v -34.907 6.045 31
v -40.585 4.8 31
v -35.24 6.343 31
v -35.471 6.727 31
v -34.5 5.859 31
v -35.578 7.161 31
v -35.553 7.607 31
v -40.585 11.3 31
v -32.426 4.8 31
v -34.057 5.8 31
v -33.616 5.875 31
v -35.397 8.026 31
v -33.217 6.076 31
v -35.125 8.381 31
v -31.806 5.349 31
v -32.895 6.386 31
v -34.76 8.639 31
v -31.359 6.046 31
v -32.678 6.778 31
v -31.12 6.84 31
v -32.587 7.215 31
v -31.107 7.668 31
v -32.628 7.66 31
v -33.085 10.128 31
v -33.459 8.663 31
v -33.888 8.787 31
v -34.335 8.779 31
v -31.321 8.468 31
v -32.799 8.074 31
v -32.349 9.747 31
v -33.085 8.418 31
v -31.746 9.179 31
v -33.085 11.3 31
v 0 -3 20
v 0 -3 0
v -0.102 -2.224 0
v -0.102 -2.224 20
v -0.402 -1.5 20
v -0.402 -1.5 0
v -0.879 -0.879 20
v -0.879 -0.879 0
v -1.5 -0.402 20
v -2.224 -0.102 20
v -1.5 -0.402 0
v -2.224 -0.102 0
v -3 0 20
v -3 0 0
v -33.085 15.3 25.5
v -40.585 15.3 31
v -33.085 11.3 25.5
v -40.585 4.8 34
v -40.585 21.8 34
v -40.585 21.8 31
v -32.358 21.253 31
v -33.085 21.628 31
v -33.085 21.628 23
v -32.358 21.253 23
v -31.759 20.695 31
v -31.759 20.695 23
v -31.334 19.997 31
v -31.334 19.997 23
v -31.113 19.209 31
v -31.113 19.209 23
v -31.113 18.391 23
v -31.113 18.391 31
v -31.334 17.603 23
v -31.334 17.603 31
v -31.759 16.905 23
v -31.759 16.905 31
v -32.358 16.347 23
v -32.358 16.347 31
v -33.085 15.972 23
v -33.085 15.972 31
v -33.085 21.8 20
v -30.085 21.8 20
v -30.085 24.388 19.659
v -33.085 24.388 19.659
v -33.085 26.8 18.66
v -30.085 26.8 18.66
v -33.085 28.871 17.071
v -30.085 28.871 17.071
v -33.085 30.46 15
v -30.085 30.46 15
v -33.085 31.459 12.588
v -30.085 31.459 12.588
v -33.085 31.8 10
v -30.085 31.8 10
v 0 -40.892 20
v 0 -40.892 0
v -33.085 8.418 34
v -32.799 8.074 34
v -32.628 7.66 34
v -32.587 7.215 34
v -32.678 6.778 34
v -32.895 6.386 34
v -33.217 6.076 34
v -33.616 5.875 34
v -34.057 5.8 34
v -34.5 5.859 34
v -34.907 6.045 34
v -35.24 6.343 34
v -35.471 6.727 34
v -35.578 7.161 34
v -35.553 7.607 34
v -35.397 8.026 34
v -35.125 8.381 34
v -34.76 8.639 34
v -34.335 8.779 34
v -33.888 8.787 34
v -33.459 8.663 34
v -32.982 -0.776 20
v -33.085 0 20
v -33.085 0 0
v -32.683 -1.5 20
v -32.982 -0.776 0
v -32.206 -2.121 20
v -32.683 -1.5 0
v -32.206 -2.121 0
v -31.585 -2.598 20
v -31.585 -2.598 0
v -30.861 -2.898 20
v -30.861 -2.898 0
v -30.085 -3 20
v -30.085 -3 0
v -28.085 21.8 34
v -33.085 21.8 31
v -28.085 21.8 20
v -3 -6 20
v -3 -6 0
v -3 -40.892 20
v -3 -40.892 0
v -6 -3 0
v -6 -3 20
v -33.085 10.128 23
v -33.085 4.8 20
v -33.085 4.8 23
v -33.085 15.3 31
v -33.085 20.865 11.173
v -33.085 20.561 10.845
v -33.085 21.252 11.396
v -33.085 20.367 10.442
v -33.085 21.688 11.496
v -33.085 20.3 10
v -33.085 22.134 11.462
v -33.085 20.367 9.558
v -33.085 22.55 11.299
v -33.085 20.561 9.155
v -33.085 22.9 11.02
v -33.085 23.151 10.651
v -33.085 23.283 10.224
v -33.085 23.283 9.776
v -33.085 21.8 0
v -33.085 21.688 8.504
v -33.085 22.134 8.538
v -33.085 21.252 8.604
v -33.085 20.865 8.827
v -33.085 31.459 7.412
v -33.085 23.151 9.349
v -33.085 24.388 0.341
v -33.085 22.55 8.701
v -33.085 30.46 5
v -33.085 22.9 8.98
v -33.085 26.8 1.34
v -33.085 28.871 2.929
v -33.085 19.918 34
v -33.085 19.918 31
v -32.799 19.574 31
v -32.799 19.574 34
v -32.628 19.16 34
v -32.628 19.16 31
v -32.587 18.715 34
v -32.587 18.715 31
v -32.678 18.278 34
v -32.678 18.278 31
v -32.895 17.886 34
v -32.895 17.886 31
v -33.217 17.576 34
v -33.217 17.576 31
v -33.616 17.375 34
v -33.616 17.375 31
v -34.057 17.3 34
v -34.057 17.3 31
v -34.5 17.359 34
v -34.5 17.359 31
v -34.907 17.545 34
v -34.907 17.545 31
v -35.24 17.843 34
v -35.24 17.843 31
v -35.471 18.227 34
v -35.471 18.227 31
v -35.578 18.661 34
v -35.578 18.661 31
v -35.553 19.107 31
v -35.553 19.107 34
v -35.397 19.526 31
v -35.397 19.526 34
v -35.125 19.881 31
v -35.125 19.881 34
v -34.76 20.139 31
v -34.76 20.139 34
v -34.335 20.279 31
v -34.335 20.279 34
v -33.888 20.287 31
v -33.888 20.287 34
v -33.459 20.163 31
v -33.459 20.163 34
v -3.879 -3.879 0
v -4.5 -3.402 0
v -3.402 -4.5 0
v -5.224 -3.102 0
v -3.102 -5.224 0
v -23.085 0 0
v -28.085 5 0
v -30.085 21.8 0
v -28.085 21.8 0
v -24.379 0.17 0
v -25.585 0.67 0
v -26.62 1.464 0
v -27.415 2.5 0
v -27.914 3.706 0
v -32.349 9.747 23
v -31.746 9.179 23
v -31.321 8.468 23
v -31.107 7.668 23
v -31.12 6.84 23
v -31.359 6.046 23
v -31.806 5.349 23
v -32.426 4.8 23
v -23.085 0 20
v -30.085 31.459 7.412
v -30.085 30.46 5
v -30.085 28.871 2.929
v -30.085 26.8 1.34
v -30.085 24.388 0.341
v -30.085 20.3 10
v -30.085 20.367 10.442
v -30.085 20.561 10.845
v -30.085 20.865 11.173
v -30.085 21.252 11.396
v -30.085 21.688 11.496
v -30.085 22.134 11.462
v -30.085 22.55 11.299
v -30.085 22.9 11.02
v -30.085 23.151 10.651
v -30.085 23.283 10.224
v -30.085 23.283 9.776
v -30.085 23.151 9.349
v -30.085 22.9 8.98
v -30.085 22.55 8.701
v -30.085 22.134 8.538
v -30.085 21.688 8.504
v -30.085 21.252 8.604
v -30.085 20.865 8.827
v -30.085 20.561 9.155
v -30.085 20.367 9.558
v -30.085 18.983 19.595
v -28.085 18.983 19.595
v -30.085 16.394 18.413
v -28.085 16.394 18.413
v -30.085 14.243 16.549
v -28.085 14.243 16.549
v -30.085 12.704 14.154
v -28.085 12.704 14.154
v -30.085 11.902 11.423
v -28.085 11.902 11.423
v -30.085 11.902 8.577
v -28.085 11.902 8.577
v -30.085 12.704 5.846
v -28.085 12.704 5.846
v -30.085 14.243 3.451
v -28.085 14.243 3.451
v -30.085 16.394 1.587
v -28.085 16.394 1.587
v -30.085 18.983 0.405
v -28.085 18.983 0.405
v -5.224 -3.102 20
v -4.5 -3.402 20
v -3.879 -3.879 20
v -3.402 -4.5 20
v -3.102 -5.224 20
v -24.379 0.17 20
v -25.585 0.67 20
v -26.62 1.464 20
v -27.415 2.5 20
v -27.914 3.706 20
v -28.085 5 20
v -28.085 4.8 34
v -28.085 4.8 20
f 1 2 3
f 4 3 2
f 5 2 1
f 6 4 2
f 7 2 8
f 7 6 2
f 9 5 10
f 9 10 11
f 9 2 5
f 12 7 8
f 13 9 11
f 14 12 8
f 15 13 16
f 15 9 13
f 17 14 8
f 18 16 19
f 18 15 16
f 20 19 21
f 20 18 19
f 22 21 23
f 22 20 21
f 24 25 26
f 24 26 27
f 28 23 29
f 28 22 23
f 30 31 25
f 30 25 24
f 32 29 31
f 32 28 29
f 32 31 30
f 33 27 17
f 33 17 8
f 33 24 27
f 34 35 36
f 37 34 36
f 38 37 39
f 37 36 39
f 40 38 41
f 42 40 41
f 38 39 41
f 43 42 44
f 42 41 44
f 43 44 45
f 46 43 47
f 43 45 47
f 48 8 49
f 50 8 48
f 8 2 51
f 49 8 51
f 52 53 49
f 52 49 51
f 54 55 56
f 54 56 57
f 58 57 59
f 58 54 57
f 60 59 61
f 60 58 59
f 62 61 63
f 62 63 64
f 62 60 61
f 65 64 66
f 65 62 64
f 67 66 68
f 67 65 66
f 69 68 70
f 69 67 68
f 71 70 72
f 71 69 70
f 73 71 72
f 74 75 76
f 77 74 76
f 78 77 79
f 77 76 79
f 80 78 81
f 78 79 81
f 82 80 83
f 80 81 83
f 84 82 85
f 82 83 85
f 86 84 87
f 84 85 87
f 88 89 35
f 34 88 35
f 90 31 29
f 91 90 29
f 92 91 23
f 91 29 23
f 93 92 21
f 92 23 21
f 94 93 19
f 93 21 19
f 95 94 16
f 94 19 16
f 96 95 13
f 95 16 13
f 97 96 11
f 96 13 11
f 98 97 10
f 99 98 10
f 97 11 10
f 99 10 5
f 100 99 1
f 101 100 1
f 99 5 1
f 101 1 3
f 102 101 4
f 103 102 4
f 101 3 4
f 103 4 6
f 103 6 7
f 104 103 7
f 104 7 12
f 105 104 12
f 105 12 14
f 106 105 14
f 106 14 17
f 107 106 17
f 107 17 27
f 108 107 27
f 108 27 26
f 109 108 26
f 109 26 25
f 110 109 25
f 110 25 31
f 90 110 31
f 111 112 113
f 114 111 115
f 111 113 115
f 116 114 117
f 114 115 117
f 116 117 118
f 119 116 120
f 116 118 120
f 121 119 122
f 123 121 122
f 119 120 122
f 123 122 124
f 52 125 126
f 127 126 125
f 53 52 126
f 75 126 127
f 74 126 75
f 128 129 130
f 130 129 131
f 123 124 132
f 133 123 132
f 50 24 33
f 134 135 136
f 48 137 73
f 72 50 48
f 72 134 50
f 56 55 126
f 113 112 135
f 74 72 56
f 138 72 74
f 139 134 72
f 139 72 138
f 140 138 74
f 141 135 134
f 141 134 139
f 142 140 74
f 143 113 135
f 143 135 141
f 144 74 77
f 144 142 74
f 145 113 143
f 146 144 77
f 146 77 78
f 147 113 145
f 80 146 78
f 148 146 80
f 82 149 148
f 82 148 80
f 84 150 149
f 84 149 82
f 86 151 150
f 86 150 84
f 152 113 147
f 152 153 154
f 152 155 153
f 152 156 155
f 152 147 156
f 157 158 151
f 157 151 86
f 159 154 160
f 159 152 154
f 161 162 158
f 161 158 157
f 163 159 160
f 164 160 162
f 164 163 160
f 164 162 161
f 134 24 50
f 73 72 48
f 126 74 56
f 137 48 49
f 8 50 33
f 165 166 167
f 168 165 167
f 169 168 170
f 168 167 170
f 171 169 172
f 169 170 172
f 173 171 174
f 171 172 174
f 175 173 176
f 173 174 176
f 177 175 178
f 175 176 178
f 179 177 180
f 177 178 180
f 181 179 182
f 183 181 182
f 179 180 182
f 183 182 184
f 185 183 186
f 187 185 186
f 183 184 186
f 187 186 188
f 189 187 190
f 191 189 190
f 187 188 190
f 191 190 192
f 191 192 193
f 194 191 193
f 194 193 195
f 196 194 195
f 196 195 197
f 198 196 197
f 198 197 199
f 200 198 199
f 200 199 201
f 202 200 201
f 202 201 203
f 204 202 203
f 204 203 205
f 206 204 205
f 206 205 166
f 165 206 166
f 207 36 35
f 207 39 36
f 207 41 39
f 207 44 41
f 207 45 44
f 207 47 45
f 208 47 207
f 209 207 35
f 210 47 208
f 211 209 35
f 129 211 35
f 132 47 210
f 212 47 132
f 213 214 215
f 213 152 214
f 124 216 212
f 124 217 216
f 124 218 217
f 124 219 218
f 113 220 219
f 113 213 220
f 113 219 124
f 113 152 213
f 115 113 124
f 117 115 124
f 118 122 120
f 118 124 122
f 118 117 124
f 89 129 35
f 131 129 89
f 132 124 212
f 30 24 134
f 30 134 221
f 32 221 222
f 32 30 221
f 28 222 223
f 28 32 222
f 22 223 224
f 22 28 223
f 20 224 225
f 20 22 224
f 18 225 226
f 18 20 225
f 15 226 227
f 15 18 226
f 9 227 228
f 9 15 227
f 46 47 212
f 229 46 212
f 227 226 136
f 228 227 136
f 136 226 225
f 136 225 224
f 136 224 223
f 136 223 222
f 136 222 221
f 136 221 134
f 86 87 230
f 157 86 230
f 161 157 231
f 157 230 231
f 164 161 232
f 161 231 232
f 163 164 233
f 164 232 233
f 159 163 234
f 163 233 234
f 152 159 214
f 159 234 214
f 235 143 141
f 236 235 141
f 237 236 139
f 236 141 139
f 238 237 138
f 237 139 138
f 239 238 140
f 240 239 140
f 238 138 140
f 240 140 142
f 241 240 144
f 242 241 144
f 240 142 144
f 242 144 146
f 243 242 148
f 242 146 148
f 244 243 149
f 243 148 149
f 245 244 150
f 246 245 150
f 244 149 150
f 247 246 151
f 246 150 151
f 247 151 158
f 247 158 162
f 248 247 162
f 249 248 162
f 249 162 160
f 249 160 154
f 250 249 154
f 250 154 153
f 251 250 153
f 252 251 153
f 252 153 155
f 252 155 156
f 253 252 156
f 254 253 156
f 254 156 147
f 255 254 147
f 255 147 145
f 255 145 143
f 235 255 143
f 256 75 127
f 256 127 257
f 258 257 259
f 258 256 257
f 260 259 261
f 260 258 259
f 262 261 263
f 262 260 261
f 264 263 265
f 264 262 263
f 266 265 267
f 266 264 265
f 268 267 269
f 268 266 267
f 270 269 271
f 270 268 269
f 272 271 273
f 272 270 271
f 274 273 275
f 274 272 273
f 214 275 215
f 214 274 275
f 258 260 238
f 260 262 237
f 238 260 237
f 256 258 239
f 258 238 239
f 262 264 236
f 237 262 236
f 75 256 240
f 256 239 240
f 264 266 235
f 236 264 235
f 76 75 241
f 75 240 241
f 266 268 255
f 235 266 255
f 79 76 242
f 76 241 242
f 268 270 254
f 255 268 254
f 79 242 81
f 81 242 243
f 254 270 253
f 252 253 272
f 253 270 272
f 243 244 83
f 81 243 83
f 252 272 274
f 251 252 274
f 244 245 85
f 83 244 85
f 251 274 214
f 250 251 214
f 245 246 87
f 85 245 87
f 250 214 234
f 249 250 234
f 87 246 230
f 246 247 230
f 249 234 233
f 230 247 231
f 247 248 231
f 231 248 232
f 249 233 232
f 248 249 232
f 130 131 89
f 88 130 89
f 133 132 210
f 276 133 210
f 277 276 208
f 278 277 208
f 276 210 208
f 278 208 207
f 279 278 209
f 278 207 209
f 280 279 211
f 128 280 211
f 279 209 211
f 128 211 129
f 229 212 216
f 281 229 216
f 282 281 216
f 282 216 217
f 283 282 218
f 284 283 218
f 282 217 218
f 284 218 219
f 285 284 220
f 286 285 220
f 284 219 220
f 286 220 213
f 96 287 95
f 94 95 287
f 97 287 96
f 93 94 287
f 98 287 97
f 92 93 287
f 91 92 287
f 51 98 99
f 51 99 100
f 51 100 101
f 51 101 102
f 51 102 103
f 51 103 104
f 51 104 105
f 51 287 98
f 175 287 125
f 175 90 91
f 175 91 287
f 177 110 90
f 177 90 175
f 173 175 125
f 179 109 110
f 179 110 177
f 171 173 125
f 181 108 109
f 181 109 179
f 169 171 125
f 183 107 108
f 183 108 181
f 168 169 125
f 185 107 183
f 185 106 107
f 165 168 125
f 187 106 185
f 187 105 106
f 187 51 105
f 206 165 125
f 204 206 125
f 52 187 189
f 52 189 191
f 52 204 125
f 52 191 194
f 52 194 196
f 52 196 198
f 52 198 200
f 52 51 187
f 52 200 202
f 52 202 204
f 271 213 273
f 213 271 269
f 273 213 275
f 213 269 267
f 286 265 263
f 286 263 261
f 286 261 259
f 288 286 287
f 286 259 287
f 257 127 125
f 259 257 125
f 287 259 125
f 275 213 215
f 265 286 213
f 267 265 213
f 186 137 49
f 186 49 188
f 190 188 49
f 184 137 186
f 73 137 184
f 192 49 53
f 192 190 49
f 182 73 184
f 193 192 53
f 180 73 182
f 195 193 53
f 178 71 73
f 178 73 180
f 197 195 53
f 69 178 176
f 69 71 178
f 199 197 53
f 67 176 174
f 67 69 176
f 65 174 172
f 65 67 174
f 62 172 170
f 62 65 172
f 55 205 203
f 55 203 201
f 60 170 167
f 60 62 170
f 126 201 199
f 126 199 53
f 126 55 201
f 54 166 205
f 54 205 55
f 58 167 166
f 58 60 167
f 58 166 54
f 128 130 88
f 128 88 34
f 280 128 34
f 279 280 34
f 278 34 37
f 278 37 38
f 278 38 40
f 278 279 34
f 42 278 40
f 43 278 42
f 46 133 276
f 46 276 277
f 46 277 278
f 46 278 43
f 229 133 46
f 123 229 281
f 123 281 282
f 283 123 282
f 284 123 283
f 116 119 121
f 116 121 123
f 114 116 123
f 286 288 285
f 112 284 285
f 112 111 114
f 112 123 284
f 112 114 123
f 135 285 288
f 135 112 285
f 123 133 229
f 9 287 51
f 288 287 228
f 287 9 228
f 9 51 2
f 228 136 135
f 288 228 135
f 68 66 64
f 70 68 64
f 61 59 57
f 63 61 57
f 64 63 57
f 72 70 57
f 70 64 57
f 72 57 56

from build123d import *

# Parameters (mm, degrees)
BOSS_EXTRUDE1_DEPTH      = 20
CUT_EXTRUDE1_DEPTH       = 3
SKETCH4_W                = 3
SKETCH4_H                = 17
BOSS_EXTRUDE2_DEPTH      = 14
SKETCH6_W                = 3
SKETCH6_H                = 17
BOSS_EXTRUDE3_DEPTH      = 7.5
SKETCH7_R                = 1.5
CUT_EXTRUDE3_DEPTH       = 7.5
SKETCH8_R                = 1.5
CUT_EXTRUDE4_DEPTH       = 10
SKETCH10_R               = 3
CUT_EXTRUDE6_DEPTH       = 8
BOSS_EXTRUDE4_DEPTH      = 2
BOSS_EXTRUDE4_DEPTH_BACK = 2
SKETCH12_W               = 14
SKETCH12_H               = 17
BOSS_EXTRUDE5_DEPTH      = 2
BOSS_EXTRUDE6_DEPTH      = 2
BOSS_EXTRUDE7_DEPTH      = 20


with BuildPart() as part:
    # Sketch1 → Boss-Extrude1 (new body)
    with BuildSketch(Plane.XY):
        with BuildLine():
            Line((-3, -6), (-3, -40.891511))
            Line((-3, -40.891511), (0, -40.891511))
            Line((0, -40.891511), (0, -3))
            ThreePointArc((0, -3), (-0.878679656, -0.878679656), (-3, 0))
            Line((-3, 0), (-27.084538342, 0))
            ThreePointArc((-27.084538342, 0), (-29.205858686, 0.878679656), (-30.084538342, 3))
            Line((-30.084538342, 3), (-30.084538342, 31.8))
            Line((-30.084538342, 31.8), (-33.084538342, 31.8))
            Line((-33.084538342, 31.8), (-33.084538342, 0))
            ThreePointArc((-33.084538342, 0), (-32.205858686, -2.121320344), (-30.084538342, -3))
            Line((-30.084538342, -3), (-6, -3))
            ThreePointArc((-6, -3), (-3.878679656, -3.878679656), (-3, -6))
        make_face()
    extrude(amount=BOSS_EXTRUDE1_DEPTH)

    # Sketch2 → Cut-Extrude1 (cut)
    with BuildSketch(Plane(origin=(-30.084538342, 0, 0), x_dir=(0, 0, -1), z_dir=(1, 0, 0))):
        with BuildLine():
            ThreePointArc((-10, 31.8), (-2.928932188, 28.871067812), (0, 21.8))
            Line((0, 21.8), (0, 31.8))
            Line((0, 31.8), (-10, 31.8))
        make_face()
        with BuildLine():
            ThreePointArc((-20, 21.8), (-17.071067812, 28.871067812), (-10, 31.8))
            Line((-10, 31.8), (-20, 31.8))
            Line((-20, 31.8), (-20, 21.8))
        make_face()
    extrude(amount=-CUT_EXTRUDE1_DEPTH, mode=Mode.SUBTRACT)

    # Sketch4 → Boss-Extrude2 (add)
    with BuildSketch(Plane.XY.offset(20)):
        with Locations((-31.584538342, 13.3)):
            Rectangle(SKETCH4_W, SKETCH4_H)
    extrude(amount=BOSS_EXTRUDE2_DEPTH)

    # Sketch6 → Boss-Extrude3 (add)
    with BuildSketch(Plane.ZY.offset(33.084538342)):
        with Locations((32.5, 13.3)):
            Rectangle(SKETCH6_W, SKETCH6_H)
    extrude(amount=BOSS_EXTRUDE3_DEPTH)

    # Sketch7 → Cut-Extrude3 (cut)
    with BuildSketch(Plane(origin=(0, 0, 31), x_dir=(-1, 0, 0), z_dir=(0, 0, -1))):
        with Locations(Location((34.084538342, 18.8, 0), (0, 0, 131.810314896))):
            Circle(SKETCH7_R)
        with Locations(Location((34.084538342, 7.3, 0), (0, 0, 131.810314896))):
            Circle(SKETCH7_R)
    extrude(amount=-CUT_EXTRUDE3_DEPTH, mode=Mode.SUBTRACT)

    # Sketch8 → Cut-Extrude4 (cut)
    with BuildSketch(Plane.ZY.offset(33.084538342)):
        with Locations(Location((10, 21.8, 0), (0, 0, 270))):
            Circle(SKETCH8_R)
    extrude(amount=-CUT_EXTRUDE4_DEPTH, mode=Mode.SUBTRACT)

    # Sketch10 → Cut-Extrude6 (cut)
    with BuildSketch(Plane(origin=(0, 0, 31), x_dir=(-1, 0, 0), z_dir=(0, 0, -1))):
        with Locations((34.084538342, 7.3)):
            Circle(SKETCH10_R)
        with Locations((34.084538342, 18.8)):
            Circle(SKETCH10_R)
    extrude(amount=CUT_EXTRUDE6_DEPTH, mode=Mode.SUBTRACT)

    # Sketch11 → Boss-Extrude4 (add, two sides: drawn at the far end of the back side and taken through both)
    with BuildSketch(Plane(origin=(0, 13.3, 0), x_dir=(1, 0, 0), z_dir=(0, 1, 0)).offset(-BOSS_EXTRUDE4_DEPTH_BACK)):
        Polygon((-33.084538342, -25.5), (-33.084538342, -31), (-40.584538342, -31), align=None)
    extrude(amount=BOSS_EXTRUDE4_DEPTH + BOSS_EXTRUDE4_DEPTH_BACK)

    # Sketch12 → Boss-Extrude5 (add)
    with BuildSketch(Plane(origin=(-30.084538342, 0, 0), x_dir=(0, 0, -1), z_dir=(1, 0, 0))):
        with Locations((-27, 13.3)):
            Rectangle(SKETCH12_W, SKETCH12_H)
    extrude(amount=BOSS_EXTRUDE5_DEPTH)

    # Sketch15 → Boss-Extrude6 (add)
    with BuildSketch(Plane(origin=(-30.084538342, 0, 0), x_dir=(0, 0, -1), z_dir=(1, 0, 0))):
        with BuildLine():
            Line((0, 21.8), (0, 0))
            Line((0, 0), (-20, 0))
            Line((-20, 0), (-20, 21.8))
            ThreePointArc((-20, 21.8), (-10, 11.8), (0, 21.8))
        make_face()
    extrude(amount=BOSS_EXTRUDE6_DEPTH)

    # Sketch16 → Boss-Extrude7 (add)
    with BuildSketch(Plane(origin=(0, 0, 0), x_dir=(-1, 0, 0), z_dir=(0, 0, -1))):
        with BuildLine():
            Line((28.084538342, 0), (23.084538342, 0))
            ThreePointArc((23.084538342, 0), (26.620072248, 1.464466094), (28.084538342, 5))
            Line((28.084538342, 5), (28.084538342, 0))
        make_face()
    extrude(amount=-BOSS_EXTRUDE7_DEPTH)


solid = part.part
